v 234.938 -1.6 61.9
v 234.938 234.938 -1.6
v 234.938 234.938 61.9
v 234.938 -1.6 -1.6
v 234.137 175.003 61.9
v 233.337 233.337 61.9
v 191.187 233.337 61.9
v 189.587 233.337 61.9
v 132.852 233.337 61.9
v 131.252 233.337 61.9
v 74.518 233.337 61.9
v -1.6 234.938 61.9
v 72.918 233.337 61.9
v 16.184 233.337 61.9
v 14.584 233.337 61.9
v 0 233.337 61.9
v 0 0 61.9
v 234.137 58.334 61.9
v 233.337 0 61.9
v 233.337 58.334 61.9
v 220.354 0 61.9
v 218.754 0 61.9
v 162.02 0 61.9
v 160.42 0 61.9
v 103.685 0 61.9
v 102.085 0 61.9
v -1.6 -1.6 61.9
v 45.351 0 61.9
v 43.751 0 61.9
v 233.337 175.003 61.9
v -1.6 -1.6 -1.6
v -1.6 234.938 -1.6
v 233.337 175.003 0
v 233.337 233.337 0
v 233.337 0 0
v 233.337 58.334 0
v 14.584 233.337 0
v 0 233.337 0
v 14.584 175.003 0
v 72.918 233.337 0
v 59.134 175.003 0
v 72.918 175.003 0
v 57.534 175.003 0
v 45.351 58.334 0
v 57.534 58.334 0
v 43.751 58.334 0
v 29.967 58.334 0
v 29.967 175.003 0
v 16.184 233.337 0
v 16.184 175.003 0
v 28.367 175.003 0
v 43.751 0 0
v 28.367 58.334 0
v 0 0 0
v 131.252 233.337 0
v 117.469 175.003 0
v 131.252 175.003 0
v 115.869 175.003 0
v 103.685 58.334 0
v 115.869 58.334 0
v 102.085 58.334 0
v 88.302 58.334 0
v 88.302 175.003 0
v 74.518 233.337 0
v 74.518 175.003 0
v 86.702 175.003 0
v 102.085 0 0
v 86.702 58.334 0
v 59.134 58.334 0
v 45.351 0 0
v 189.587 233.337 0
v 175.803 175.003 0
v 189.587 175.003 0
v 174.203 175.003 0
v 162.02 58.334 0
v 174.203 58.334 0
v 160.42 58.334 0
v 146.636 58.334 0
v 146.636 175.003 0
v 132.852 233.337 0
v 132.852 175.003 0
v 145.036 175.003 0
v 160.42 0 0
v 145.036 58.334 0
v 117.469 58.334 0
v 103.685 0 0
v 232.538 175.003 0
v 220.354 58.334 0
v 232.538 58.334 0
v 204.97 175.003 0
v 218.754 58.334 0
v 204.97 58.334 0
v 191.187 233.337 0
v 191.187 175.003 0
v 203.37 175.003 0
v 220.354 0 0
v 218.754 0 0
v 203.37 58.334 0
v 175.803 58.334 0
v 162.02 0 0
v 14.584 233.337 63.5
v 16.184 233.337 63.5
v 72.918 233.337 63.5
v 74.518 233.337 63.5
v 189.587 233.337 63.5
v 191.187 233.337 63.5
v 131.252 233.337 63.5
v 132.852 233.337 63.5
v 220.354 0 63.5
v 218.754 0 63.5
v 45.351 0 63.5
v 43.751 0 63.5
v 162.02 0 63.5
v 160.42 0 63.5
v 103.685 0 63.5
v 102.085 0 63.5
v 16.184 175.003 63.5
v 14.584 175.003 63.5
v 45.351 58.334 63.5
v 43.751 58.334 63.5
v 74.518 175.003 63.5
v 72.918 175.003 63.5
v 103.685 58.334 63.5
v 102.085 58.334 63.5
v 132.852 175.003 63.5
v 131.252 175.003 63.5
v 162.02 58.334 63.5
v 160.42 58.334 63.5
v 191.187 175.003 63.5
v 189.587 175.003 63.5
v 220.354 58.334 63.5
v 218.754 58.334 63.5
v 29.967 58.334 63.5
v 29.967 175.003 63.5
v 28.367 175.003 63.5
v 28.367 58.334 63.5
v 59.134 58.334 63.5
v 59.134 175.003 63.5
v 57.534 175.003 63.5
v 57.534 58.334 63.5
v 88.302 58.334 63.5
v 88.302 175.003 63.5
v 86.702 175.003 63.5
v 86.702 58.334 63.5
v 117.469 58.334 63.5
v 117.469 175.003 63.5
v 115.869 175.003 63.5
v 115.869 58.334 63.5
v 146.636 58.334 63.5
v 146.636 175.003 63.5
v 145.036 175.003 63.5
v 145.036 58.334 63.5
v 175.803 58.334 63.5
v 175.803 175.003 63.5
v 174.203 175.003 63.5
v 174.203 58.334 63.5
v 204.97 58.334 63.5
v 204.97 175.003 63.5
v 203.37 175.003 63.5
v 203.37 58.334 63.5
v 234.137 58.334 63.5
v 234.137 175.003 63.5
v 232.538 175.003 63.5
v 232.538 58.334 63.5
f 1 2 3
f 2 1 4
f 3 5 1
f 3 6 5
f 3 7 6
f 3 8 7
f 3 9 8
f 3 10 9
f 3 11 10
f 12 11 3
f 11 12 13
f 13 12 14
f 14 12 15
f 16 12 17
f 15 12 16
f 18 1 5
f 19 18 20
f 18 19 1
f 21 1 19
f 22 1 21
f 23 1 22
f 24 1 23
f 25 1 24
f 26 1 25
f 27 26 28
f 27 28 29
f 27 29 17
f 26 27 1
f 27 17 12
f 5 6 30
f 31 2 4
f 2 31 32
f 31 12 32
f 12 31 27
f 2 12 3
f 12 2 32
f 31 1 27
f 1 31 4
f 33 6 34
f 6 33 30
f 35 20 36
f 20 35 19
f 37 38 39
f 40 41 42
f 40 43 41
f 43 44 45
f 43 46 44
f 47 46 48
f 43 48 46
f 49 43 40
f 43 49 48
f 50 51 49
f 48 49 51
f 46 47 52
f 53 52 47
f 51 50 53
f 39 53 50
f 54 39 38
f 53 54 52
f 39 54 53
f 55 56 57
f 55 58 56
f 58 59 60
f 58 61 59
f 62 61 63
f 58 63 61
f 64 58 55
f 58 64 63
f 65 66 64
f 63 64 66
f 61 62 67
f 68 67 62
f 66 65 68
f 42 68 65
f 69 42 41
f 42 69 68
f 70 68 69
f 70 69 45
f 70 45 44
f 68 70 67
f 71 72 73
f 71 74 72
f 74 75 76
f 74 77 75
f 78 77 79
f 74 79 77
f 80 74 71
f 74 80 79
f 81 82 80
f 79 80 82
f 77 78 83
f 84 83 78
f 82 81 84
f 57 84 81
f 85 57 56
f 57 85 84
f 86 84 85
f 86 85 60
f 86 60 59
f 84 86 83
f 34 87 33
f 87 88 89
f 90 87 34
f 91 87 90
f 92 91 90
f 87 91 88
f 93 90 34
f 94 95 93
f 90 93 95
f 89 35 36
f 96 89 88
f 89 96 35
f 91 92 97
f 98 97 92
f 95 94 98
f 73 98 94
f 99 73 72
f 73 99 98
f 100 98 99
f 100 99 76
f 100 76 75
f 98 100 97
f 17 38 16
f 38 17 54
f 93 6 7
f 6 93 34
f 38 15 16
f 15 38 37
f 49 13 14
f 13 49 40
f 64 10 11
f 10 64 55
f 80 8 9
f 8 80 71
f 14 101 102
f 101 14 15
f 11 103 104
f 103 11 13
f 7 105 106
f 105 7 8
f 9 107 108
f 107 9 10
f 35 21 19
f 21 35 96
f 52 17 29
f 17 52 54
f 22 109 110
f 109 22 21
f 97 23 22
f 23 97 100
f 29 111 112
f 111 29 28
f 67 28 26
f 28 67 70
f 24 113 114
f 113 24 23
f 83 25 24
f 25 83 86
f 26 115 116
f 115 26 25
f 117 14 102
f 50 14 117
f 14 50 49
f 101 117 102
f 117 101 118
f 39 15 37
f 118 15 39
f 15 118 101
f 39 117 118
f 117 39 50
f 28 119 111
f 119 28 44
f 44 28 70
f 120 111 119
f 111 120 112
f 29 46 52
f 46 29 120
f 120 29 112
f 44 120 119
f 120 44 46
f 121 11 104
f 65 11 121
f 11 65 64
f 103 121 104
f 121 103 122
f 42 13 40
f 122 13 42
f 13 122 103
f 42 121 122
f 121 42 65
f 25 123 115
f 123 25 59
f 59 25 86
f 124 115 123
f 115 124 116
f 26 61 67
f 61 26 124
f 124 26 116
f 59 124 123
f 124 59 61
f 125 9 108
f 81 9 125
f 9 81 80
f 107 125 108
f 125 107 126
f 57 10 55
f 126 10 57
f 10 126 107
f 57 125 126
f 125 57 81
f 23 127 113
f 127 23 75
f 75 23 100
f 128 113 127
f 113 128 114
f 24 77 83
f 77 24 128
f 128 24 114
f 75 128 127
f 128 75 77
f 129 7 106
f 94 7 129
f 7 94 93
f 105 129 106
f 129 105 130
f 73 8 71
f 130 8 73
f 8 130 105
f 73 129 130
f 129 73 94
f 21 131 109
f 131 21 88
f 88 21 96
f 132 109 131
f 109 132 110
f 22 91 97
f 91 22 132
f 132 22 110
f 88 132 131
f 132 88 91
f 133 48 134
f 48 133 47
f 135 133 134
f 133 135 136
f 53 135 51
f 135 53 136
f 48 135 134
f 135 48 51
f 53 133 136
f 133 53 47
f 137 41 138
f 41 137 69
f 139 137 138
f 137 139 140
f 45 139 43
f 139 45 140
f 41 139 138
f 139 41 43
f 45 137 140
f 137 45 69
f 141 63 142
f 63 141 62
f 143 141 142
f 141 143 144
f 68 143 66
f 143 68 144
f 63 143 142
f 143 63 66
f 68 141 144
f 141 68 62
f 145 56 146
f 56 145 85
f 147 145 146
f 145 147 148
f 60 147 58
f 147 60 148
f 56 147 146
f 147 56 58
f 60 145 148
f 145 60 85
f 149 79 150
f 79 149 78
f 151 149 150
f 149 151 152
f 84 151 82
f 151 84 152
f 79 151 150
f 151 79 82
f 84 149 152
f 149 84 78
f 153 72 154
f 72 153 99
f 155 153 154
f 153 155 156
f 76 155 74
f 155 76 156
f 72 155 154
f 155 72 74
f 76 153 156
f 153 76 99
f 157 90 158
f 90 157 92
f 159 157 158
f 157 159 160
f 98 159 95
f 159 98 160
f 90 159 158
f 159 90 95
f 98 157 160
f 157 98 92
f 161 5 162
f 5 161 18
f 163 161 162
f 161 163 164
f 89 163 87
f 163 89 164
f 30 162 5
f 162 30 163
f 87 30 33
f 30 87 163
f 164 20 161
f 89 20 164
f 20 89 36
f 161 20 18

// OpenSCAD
//measurements
in_width = 9.3125;
in_fork = 8;
in_soup = 8;
in_cereal = 7;
in_chopstick = 9;
in_chop = 7.5;
in_head_l = 2.5;
in_head_w = 1.5;
//design parameters
thin_wall_thickness = 1.6;
sections = 8;
//constants
inch = 25.4;
//calculated
twt = thin_wall_thickness;
width = in_width * inch;
head_w = in_head_w * inch;

lwh_outer = [width,width,2.5*inch];
lwh_inner = lwh_outer - 2*twt*[1,1,0];

module maybe_mirror(xyz, yes){
  if(yes){
    mirror(xyz) children();
  } else {
    children();
  }
}


difference(){
  translate(-[twt,twt,twt]) cube(lwh_outer);
  cube(lwh_inner);
}
%translate([0,0,-2])cube([256,256,1]);

%for(i=[1:sections]){
  len_barrier = lwh_inner[1]/4;
    translate([(i-.5)*lwh_inner[0]/sections,lwh_inner[1]/2,0])
    maybe_mirror([0,1,0],(i%2)==0)
    translate([0,-lwh_inner[1]/3,0])
    #cube(head_w, center=true);
}

for(i=[1:sections]){
  len_barrier = lwh_inner[1]/4;

    translate([(i-.5)*lwh_inner[0]/sections,lwh_inner[1]/2,0])
    maybe_mirror([0,1,0],(i%2))
    translate([0,-lwh_inner[1]/2,0])
    cube([twt,len_barrier,lwh_inner[2]]);
}
for(i=[1:sections]){
  len_barrier = lwh_inner[1]/2;

    translate([i*lwh_inner[0]/sections,lwh_inner[1]/2,lwh_inner[2]/2])
    cube([twt,len_barrier,lwh_inner[2]], center=true);
}
